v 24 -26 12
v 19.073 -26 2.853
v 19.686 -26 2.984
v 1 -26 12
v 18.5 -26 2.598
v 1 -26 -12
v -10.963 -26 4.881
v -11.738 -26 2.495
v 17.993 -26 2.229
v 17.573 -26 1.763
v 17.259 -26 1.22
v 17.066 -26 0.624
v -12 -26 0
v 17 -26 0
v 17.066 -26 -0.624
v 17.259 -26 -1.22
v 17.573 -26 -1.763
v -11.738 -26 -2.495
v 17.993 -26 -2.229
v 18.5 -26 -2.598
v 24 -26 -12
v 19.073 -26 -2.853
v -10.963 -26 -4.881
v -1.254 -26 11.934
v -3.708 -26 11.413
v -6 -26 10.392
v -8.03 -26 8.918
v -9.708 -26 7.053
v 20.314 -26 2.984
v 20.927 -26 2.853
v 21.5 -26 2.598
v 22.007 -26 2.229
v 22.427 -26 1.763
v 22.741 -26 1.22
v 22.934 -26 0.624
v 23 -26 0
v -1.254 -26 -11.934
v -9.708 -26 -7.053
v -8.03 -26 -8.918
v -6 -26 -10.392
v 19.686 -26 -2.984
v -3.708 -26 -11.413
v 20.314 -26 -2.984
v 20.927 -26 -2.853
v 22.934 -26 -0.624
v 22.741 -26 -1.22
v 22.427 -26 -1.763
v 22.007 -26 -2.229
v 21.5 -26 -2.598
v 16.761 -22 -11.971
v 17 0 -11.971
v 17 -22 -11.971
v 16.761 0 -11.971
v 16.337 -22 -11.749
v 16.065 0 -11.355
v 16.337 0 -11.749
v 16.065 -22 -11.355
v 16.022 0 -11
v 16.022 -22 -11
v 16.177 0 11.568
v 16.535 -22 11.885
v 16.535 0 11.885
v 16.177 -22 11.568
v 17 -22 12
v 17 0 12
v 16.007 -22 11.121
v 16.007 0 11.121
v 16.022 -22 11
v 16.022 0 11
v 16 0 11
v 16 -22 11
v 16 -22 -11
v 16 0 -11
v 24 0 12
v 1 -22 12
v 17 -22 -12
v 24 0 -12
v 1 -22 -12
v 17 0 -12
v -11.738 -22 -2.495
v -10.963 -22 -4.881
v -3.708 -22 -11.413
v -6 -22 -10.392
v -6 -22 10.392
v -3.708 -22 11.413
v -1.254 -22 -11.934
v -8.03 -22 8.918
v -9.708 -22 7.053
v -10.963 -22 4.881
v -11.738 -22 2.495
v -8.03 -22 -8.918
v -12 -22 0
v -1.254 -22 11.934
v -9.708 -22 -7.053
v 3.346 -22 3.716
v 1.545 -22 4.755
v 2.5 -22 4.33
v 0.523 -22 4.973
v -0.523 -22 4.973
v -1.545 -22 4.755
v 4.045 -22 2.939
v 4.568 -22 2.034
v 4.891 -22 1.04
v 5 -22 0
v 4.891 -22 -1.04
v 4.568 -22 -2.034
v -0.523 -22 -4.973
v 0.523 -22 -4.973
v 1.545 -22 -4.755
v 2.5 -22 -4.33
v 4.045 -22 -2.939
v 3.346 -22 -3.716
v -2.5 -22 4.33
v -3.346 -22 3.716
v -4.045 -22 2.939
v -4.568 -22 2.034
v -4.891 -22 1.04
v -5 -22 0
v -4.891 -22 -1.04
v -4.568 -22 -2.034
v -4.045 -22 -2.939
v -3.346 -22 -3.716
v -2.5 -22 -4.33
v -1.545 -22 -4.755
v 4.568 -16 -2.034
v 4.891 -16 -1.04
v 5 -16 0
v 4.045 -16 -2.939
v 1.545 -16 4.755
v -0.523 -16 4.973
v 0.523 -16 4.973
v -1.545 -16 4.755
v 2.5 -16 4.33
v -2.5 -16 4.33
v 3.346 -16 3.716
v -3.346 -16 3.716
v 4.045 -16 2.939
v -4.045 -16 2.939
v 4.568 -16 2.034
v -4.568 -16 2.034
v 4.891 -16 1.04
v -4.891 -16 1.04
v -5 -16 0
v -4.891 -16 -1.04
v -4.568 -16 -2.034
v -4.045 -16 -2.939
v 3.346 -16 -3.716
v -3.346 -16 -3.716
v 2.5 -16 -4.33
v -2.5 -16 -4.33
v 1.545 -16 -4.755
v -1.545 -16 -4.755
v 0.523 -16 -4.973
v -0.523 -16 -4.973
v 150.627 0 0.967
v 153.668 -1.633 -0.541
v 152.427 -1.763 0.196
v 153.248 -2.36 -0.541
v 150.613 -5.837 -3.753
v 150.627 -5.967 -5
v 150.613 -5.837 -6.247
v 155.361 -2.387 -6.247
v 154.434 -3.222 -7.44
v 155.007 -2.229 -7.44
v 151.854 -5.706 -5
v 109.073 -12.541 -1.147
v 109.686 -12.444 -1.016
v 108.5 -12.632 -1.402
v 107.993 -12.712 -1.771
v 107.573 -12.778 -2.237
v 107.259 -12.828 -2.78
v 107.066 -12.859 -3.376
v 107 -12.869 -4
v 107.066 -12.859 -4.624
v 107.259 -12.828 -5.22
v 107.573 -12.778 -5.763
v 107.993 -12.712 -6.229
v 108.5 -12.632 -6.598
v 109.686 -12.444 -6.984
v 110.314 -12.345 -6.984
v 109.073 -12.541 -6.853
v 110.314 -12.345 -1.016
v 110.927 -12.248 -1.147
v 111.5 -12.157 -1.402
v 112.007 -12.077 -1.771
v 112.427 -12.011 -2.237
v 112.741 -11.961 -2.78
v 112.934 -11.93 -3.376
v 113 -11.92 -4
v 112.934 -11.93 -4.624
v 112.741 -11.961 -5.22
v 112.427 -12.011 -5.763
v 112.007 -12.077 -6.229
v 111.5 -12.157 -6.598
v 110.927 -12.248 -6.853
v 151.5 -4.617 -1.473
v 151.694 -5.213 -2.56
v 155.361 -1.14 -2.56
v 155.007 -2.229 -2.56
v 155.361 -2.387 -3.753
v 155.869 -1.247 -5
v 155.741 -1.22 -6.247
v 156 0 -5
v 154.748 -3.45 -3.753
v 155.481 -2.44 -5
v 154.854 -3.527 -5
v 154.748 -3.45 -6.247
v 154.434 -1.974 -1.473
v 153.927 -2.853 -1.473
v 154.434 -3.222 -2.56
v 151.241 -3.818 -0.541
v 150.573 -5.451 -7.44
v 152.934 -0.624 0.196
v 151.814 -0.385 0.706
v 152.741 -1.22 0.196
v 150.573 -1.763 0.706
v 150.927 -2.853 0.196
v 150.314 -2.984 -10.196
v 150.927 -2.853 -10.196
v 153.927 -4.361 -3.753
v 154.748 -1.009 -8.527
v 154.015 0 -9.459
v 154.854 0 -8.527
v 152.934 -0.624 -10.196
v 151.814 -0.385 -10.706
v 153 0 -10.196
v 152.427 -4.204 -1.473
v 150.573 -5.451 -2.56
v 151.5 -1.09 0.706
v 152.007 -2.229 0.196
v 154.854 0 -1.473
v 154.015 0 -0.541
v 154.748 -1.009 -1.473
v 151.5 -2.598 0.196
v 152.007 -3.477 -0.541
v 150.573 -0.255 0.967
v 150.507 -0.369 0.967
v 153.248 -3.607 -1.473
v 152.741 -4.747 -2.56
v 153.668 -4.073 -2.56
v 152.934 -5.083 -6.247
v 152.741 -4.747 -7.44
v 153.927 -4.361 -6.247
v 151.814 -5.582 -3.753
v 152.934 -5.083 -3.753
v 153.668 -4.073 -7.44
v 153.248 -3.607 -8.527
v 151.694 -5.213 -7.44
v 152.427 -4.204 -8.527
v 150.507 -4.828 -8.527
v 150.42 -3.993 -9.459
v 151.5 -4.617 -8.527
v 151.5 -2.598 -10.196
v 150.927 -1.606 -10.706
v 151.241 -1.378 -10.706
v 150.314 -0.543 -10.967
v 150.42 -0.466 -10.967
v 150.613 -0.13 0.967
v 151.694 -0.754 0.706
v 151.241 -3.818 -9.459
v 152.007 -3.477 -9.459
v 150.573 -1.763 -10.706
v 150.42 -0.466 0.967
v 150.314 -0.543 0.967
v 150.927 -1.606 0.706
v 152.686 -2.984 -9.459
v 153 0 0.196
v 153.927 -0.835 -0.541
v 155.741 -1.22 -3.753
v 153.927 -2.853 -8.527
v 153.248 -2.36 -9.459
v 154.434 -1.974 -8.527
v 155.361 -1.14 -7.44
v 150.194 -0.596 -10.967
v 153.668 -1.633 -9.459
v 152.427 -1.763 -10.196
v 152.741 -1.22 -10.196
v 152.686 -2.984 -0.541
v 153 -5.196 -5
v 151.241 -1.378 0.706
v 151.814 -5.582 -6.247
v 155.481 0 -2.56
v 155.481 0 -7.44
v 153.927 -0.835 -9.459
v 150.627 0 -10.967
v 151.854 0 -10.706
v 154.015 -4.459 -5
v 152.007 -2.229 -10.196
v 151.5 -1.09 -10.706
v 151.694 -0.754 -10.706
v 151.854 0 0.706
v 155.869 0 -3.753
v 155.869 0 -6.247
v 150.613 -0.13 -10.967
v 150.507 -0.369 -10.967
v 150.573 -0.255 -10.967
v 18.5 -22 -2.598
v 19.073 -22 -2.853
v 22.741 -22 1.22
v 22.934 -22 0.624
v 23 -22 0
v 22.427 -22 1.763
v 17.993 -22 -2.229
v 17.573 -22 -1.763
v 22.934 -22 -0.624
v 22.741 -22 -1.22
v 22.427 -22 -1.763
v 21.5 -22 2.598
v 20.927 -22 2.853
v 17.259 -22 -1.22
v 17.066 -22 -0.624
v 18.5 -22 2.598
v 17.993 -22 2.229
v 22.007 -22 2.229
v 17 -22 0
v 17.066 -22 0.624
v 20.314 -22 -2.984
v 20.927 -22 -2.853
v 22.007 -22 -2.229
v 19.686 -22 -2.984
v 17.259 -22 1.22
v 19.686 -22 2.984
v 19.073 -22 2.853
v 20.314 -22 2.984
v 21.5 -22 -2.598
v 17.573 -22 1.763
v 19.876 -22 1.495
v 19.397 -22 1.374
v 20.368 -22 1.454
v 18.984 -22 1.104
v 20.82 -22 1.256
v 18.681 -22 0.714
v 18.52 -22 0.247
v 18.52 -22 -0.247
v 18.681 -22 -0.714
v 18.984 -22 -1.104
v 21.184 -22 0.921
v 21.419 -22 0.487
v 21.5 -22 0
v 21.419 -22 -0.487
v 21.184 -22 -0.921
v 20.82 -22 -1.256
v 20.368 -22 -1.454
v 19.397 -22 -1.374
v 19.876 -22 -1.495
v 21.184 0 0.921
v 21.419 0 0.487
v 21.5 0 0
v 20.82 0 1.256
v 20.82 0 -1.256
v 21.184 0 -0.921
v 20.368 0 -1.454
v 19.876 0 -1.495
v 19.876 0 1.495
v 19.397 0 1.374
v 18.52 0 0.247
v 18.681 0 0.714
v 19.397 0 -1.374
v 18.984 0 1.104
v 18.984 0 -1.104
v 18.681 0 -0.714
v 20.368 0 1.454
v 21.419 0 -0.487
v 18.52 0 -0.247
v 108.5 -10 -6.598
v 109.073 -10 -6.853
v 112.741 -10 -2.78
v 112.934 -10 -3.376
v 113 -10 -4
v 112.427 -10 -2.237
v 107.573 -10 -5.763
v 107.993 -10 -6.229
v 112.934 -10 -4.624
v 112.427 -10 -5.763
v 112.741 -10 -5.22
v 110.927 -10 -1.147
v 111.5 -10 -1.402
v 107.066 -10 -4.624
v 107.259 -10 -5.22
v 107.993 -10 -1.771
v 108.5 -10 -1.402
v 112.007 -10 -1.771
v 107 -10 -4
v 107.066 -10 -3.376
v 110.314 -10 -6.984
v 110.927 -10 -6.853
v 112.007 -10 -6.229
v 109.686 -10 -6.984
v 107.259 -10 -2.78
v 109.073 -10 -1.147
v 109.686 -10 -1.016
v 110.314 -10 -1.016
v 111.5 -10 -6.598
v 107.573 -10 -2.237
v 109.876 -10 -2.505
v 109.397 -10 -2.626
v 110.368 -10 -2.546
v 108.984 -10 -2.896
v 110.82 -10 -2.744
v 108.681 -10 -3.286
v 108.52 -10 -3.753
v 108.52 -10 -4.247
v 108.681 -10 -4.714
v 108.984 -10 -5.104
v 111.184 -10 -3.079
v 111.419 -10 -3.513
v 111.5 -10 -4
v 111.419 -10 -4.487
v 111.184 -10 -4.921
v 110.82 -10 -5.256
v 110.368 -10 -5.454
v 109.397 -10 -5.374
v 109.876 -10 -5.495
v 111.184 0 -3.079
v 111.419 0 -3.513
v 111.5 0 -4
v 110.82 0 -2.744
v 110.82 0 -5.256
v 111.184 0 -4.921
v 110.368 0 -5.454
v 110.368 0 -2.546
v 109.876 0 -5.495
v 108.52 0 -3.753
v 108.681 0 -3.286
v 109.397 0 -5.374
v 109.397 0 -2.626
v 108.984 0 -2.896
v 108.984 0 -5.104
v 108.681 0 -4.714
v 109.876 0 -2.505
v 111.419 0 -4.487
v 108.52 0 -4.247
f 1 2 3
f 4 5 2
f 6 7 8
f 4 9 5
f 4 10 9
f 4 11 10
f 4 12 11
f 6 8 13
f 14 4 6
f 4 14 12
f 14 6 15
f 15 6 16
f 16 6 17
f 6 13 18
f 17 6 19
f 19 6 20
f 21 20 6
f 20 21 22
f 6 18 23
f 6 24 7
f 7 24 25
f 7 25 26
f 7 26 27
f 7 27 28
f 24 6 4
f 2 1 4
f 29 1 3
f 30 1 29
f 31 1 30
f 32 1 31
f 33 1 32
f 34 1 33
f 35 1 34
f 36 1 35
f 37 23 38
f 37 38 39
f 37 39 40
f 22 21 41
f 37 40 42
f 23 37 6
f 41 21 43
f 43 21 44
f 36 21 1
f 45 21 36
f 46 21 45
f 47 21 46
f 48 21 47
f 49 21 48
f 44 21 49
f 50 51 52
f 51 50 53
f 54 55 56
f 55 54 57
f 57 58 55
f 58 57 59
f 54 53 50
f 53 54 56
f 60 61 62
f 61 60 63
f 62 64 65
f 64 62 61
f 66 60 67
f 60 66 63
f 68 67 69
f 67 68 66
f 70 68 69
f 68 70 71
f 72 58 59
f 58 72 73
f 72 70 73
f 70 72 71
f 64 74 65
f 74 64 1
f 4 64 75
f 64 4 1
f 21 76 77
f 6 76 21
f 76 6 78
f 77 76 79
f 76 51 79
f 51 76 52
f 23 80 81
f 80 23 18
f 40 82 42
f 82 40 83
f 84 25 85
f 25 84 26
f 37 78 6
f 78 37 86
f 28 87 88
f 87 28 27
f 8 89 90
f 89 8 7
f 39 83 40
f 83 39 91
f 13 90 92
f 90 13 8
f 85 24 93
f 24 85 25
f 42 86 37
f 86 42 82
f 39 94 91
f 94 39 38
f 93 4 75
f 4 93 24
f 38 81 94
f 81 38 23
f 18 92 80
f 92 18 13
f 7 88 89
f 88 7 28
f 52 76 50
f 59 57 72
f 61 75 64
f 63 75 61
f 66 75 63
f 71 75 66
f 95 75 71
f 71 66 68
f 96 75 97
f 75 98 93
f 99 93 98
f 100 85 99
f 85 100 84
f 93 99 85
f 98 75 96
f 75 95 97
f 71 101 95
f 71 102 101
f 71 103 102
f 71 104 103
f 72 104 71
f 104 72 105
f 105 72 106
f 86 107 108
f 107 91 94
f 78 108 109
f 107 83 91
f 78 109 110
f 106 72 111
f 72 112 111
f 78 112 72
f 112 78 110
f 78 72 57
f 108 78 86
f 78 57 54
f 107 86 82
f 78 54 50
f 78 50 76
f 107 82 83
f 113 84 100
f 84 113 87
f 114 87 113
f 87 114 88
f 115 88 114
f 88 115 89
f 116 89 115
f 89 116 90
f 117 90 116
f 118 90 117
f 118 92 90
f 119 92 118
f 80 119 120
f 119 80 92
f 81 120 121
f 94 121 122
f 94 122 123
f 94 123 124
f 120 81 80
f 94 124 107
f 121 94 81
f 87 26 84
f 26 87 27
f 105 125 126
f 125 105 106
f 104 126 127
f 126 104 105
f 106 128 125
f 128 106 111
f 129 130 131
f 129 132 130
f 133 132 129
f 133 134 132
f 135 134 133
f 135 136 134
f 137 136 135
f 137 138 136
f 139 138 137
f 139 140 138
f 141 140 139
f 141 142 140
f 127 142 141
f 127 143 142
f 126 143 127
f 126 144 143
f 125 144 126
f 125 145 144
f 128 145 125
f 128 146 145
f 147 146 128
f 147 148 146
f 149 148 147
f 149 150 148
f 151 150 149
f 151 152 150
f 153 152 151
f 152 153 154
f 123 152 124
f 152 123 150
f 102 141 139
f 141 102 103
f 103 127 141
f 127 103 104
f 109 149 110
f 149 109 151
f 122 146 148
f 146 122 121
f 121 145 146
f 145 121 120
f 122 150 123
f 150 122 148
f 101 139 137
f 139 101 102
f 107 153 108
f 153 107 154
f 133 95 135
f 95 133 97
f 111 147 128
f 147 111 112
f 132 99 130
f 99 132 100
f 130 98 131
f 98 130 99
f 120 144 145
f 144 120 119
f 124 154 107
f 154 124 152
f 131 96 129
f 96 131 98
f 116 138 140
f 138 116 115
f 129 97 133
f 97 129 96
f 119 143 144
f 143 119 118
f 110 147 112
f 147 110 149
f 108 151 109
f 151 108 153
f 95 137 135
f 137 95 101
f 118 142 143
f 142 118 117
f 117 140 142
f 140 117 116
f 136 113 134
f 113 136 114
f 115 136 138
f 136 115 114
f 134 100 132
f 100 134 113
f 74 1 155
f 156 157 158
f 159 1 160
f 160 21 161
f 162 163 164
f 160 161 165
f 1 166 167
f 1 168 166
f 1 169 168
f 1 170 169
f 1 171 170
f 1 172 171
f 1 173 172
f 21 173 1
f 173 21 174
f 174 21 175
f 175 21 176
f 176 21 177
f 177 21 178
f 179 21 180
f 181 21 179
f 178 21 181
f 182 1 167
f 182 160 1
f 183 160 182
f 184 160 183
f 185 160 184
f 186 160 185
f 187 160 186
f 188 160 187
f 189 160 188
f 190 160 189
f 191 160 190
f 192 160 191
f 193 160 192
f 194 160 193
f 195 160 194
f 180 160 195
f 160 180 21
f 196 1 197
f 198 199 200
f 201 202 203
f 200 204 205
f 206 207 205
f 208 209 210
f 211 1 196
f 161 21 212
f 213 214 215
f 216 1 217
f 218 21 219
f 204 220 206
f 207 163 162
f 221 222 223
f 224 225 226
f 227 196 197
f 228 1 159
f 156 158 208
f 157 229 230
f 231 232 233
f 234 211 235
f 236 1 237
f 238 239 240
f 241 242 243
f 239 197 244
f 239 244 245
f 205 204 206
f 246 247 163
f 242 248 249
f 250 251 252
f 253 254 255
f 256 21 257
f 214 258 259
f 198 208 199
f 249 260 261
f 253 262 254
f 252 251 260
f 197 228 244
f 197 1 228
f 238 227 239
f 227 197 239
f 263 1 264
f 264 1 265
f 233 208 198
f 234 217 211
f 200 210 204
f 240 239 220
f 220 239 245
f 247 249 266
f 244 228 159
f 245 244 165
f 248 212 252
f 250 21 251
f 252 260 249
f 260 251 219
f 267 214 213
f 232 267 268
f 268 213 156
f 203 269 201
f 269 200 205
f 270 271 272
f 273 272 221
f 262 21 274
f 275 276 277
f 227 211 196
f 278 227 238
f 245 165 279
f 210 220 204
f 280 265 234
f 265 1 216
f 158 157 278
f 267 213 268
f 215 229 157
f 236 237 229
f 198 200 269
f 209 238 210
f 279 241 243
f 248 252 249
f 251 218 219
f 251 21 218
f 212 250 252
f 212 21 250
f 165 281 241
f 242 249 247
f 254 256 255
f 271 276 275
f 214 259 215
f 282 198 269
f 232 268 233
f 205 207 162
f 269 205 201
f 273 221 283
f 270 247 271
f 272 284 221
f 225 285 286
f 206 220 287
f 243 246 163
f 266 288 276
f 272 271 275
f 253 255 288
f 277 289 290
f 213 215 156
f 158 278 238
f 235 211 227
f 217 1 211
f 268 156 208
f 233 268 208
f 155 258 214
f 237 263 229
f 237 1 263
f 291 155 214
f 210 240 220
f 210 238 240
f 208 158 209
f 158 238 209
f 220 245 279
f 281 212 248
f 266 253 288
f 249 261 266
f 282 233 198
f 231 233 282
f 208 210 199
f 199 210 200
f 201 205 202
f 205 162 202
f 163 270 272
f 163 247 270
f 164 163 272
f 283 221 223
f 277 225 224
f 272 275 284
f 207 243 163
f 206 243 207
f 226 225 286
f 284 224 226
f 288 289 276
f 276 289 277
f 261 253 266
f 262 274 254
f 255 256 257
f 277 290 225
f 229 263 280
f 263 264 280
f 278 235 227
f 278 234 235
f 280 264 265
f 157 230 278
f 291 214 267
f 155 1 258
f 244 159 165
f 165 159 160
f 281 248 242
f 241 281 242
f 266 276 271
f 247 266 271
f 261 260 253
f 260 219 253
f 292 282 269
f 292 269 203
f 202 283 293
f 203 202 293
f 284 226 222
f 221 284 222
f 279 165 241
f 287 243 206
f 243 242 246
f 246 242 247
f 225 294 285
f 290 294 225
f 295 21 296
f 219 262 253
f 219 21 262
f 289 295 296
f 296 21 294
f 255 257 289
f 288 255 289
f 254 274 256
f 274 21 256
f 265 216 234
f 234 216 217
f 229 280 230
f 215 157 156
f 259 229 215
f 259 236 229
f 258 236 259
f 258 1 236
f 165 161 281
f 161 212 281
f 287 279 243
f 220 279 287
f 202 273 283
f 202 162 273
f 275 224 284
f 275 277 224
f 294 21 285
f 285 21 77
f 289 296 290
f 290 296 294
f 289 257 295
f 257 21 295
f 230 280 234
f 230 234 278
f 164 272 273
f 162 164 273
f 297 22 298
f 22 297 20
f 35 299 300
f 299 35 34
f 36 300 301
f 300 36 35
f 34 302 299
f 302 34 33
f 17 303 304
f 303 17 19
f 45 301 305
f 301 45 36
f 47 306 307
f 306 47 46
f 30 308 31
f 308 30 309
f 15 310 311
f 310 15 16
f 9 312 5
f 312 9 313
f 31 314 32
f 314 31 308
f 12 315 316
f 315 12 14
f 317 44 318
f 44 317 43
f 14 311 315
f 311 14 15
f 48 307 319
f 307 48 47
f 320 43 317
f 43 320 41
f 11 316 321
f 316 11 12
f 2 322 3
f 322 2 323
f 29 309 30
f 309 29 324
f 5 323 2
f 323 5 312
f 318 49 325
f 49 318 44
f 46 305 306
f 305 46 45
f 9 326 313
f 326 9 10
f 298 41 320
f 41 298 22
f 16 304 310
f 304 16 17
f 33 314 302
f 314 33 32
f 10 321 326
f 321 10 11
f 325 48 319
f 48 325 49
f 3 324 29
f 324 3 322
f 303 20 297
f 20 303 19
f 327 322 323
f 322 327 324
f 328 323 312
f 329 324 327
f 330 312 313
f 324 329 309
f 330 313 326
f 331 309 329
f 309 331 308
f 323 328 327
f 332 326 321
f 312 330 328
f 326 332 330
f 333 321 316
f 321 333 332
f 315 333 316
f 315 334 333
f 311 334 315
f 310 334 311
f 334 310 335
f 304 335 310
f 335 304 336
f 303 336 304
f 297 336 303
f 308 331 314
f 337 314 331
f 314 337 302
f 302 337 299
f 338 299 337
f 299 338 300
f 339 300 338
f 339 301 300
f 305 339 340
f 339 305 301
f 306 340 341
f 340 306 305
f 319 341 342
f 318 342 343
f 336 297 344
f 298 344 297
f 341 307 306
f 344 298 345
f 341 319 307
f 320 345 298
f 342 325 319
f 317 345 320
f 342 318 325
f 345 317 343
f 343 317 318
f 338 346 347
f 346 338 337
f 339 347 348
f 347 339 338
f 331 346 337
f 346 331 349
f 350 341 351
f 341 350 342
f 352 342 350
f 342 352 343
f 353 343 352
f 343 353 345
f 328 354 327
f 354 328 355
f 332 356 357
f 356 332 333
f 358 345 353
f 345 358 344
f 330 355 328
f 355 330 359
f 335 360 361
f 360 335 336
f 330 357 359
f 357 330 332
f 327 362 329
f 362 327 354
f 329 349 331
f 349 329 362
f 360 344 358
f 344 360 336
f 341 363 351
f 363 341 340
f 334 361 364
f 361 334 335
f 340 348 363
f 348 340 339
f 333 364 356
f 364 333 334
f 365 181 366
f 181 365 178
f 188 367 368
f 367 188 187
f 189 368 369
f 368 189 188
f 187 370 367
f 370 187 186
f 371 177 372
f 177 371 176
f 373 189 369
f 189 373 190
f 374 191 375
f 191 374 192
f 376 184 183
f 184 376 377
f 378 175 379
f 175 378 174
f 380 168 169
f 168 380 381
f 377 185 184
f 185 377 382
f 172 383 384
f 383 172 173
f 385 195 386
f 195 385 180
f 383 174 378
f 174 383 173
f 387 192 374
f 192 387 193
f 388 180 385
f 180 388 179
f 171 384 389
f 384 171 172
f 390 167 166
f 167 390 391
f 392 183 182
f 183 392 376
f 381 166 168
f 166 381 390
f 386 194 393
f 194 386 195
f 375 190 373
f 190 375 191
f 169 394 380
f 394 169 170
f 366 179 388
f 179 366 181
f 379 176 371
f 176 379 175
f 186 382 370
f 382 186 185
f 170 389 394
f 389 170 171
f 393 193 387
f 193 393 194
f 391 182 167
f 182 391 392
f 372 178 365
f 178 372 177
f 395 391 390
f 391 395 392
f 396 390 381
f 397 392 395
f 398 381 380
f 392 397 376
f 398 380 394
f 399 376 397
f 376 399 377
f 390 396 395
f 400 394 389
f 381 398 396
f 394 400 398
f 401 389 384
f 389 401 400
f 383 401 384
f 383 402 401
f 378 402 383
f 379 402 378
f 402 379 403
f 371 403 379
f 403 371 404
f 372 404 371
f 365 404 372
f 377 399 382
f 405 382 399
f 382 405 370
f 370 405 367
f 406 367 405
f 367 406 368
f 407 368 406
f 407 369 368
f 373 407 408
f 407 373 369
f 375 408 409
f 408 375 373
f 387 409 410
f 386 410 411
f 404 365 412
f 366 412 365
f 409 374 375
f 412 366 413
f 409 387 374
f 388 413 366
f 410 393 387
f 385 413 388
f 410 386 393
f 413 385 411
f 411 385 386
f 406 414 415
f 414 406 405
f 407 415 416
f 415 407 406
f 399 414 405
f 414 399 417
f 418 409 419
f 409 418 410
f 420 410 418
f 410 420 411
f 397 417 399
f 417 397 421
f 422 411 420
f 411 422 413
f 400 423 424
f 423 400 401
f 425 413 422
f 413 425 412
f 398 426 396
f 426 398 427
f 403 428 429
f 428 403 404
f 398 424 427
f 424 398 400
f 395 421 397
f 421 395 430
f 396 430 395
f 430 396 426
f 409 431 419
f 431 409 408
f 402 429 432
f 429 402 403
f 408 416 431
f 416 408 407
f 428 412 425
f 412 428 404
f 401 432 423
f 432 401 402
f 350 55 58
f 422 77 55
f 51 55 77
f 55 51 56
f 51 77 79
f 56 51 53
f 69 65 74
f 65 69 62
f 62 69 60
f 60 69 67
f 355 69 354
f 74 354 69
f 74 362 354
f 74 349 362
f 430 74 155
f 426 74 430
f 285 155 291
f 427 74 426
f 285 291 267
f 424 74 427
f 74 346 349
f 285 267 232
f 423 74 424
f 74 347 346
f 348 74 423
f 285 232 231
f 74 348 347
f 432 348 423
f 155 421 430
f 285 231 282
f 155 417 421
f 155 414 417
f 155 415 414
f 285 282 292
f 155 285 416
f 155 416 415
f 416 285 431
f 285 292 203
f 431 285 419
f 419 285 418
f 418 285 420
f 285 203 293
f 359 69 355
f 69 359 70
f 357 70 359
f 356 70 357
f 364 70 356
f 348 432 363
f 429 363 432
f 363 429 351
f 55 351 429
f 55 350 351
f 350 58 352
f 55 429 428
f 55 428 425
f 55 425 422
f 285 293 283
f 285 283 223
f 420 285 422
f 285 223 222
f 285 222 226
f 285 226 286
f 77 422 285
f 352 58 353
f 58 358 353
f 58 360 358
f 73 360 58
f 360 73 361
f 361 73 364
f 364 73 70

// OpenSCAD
// file: ../non-printable-components/servo.scad
24g_motor();

module 9g_motor(){
	difference(){			
		union(){
			color("blue") cube([23,12.5,22], center=true);
			color("blue") translate([0,0,5]) cube([32,12,2], center=true);
			color("blue") translate([5.5,0,2.75]) cylinder(r=6, h=25.75, $fn=20, center=true);
			color("blue") translate([-.5,0,2.75]) cylinder(r=1, h=25.75, $fn=20, center=true);
			color("blue") translate([-1,0,2.75]) cube([5,5.6,24.5], center=true);		
			color("white") translate([5.5,0,3.65]) cylinder(r=2.35, h=29.25, $fn=20, center=true);				
		}
		translate([10,0,-11]) rotate([0,-30,0]) cube([8,13,4], center=true);
		for ( hole = [14,-14] ){
			translate([hole,0,5]) cylinder(r=2.2, h=4, $fn=20, center=true);
		}	
	}
}

module 24g_motor(){
	difference(){			
		union(){
			color("black") cube([31.4,16.5,28.6], center=true);
			color("black") translate([0,0,8.55]) cube([42,16,2.5], center=true);
            
            color("black")
            hull() {
			 translate([7.6,0,0]) cylinder(r=8.2, h=15.3, $fn=20);
                translate([3.5,0,7.65])
                cube([8.2,16.4,15.3], center=true);

            }
            color("black")
            translate([-7.6,0,7.65])
                cube([10.5,16.4,15.3], center=true);
		
			color("gold") translate([7.6,0,4.15]) cylinder(r=2.9, h=29.25, $fn=20, center=true);				
		}
		for ( hole = [19,-19] ){
			translate([hole,4,8]) cylinder(r=2.2, h=4, $fn=20, center=true);
            translate([hole,-4,8]) cylinder(r=2.2, h=4, $fn=20, center=true);
		}	
	}
    
    translate([15.7,1.2,-5.2])
    rotate([0,90,0])
    cylinder(r=0.6,h=3,$fn=20);
    color("red")
    translate([15.7,0,-5.2])
    rotate([0,90,0])
    cylinder(r=0.6,h=3,$fn=20);
    color("#604030")
    translate([15.7,-1.2,-5.2])
    rotate([0,90,0])
    cylinder(r=0.6,h=3,$fn=20);
}
// file: ../modules/barrel_joint.scad
use <../non-printable-components/servo.scad>
use <MCAD/regular_shapes.scad>
use <MCAD/boxes.scad>
$fs = 0.5;
module barrel_joint(diameter, bearing_size) {
        difference() {
                hull() {
                    cylinder(d=diameter, h=38);
                    translate([-diameter/2,0,19])
                    cube([diameter, diameter, 38], center=true);
                }
                translate([0,0,-1])
                cylinder(d=bearing_size,h=6);
                translate([0,0,33])
                cylinder(d=bearing_size,h=6);
                translate([-5.5, 0,17])
                9g_motor();
                hull() {
                    translate([0,0,6])
                    cylinder(r=6,h=27);
                    translate([-20,0,19.6])
                    cube([20,13,28], center=true);
                    
                }
                translate([0,0,22])
                cube([diameter, 12.2, 2.2], center=true);
                translate([-16,0,2])
                rotate([0,-90,0])
                cylinder(d=3,h=8);
                translate([-16,0,36])
                rotate([0,-90,0])
                cylinder(d=3,h=8);
        }
        
}

module barrel_joint_split_9g(diameter, bearing_size, inverse=false) {
    inversion = inverse ? -1 : 1;
    difference() {
         hull() {
            cylinder(d=diameter, h=38);
            translate([-diameter/2,0,19])
            cube([diameter, diameter, 38], center=true);
        }
        translate([0,0,-1])
        cylinder(d=bearing_size,h=6);
        translate([0,0,33])
        cylinder(d=bearing_size,h=6);
        translate([-5.5, 0,17])
        9g_motor();
        hull() {
            translate([0,0,6])
            cylinder(r=6,h=27);
            translate([-20,0,19.6])
            cube([20,13,28], center=true);
            
        }
        translate([0,0,22])
        cube([diameter, 12.2, 2.2], center=true);
        translate([0,20 * inversion,0])
        cube([50,40,80], center=true);
        
        translate([-16,20,2.5])
        rotate([90,0,0])
        cylinder(d=3,h=40);
        translate([-16,20,35.5])
        rotate([90,0,0])
        cylinder(d=3,h=40);
    }
}

module barrel_joint_split_24g(diameter, bearing_size, inverse=false) {
    inversion = inverse ? -1 : 1;
    difference() {
         hull() {
            cylinder(d=diameter, h=42);
            translate([-15,0,21])
            cube([30, diameter, 42], center=true);
        }
        translate([0,0,-1])
        cylinder(d=bearing_size,h=6);
        translate([0,0,37])
        cylinder(d=bearing_size,h=6);
        translate([-7.6, 0,21])
        24g_motor();
        hull() {
            translate([0,0,6])
            cylinder(r=8.3,h=31.01);
            translate([-21,0,21.505])
            cube([20,16.6,31.01], center=true);
            
        }
        translate([0,0,29.5])
        cube([diameter, 16, 2.6], center=true);
        translate([0,20 * inversion,0])
        cube([65,40,85], center=true);
        
        translate([-16,20,2.5])
        rotate([90,0,0])
        cylinder(d=3,h=40);
        translate([-16,20,39.5])
        rotate([90,0,0])
        cylinder(d=3,h=40);
        
        translate([-10,0,11])
        cube([42,5,11], center=true);
    }
}

module barrel_joint_attachment(diameter, width) {
     translate([0,0,-18]) {
                rotate([90,0,90])
                roundedBox(size=[diameter,4, width], radius=1, sidesonly=true);
            }
            translate([-width/2,0,0])
            rotate([0,90,0]){
            hull() {
                translate([diameter/2,0,2])
                roundedBox(size=[diameter,diameter,4],radius=1, sidesonly=true);
                cylinder(d=diameter, h=4);
            }
            cylinder(h=10,r=5);
        }
            
            translate([width/2,0,0])
            rotate([180,90,0]){
            hull() {
                translate([diameter/2,0,2])
                roundedBox(size=[diameter,diameter,4],radius=1, sidesonly=true);
                cylinder(d = diameter, h=4);
            }
            cylinder(h=10,r=5);
        }
}

//barrel_joint_split_24g(24,19);
//translate([-7.6,0,21])
//24g_motor();
//barrel_joint(22,19);
//translate([-5.5, 0,17])
//9g_motor();

barrel_joint_attachment(22,52);
// main file
use <../modules/barrel_joint.scad>

$fs=0.5;

module bolt_hole(width) {
    rotate([90,0,0]){
            translate([0,0,width/2-2])
            cylinder(r=3,h=50);
            translate([0,0,-width/2+2])
            rotate([180,0,0])
            cylinder(r=3,h=50);
        
            translate([0,0,-25])
            cylinder(r=1.5,h=50);
        }
    }

module tib_1_main(length=150, inverse = false) {
    inversion = inverse ? -1 : 1;
    difference(){
        union() {
            rotate([90,0,-90])
            barrel_joint_attachment(24,52);
            
            hull(){
                translate([21,0,0])
                cube([6,52,24],center=true);
                
                translate([length,0,-5])
                sphere(6);
            
            }
        }
        
        translate([20,0,0])
        bolt_hole(48);
        
        translate([length - 40,0,-4])
        bolt_hole(24);
        
        translate([length/2,20 * inversion,0])
        cube([length + 50,40,80], center=true);
        
    }
};

module tib_1(){
    tib_1_main();
    tib_1_main(inverse=true);
}

tib_1_main();
